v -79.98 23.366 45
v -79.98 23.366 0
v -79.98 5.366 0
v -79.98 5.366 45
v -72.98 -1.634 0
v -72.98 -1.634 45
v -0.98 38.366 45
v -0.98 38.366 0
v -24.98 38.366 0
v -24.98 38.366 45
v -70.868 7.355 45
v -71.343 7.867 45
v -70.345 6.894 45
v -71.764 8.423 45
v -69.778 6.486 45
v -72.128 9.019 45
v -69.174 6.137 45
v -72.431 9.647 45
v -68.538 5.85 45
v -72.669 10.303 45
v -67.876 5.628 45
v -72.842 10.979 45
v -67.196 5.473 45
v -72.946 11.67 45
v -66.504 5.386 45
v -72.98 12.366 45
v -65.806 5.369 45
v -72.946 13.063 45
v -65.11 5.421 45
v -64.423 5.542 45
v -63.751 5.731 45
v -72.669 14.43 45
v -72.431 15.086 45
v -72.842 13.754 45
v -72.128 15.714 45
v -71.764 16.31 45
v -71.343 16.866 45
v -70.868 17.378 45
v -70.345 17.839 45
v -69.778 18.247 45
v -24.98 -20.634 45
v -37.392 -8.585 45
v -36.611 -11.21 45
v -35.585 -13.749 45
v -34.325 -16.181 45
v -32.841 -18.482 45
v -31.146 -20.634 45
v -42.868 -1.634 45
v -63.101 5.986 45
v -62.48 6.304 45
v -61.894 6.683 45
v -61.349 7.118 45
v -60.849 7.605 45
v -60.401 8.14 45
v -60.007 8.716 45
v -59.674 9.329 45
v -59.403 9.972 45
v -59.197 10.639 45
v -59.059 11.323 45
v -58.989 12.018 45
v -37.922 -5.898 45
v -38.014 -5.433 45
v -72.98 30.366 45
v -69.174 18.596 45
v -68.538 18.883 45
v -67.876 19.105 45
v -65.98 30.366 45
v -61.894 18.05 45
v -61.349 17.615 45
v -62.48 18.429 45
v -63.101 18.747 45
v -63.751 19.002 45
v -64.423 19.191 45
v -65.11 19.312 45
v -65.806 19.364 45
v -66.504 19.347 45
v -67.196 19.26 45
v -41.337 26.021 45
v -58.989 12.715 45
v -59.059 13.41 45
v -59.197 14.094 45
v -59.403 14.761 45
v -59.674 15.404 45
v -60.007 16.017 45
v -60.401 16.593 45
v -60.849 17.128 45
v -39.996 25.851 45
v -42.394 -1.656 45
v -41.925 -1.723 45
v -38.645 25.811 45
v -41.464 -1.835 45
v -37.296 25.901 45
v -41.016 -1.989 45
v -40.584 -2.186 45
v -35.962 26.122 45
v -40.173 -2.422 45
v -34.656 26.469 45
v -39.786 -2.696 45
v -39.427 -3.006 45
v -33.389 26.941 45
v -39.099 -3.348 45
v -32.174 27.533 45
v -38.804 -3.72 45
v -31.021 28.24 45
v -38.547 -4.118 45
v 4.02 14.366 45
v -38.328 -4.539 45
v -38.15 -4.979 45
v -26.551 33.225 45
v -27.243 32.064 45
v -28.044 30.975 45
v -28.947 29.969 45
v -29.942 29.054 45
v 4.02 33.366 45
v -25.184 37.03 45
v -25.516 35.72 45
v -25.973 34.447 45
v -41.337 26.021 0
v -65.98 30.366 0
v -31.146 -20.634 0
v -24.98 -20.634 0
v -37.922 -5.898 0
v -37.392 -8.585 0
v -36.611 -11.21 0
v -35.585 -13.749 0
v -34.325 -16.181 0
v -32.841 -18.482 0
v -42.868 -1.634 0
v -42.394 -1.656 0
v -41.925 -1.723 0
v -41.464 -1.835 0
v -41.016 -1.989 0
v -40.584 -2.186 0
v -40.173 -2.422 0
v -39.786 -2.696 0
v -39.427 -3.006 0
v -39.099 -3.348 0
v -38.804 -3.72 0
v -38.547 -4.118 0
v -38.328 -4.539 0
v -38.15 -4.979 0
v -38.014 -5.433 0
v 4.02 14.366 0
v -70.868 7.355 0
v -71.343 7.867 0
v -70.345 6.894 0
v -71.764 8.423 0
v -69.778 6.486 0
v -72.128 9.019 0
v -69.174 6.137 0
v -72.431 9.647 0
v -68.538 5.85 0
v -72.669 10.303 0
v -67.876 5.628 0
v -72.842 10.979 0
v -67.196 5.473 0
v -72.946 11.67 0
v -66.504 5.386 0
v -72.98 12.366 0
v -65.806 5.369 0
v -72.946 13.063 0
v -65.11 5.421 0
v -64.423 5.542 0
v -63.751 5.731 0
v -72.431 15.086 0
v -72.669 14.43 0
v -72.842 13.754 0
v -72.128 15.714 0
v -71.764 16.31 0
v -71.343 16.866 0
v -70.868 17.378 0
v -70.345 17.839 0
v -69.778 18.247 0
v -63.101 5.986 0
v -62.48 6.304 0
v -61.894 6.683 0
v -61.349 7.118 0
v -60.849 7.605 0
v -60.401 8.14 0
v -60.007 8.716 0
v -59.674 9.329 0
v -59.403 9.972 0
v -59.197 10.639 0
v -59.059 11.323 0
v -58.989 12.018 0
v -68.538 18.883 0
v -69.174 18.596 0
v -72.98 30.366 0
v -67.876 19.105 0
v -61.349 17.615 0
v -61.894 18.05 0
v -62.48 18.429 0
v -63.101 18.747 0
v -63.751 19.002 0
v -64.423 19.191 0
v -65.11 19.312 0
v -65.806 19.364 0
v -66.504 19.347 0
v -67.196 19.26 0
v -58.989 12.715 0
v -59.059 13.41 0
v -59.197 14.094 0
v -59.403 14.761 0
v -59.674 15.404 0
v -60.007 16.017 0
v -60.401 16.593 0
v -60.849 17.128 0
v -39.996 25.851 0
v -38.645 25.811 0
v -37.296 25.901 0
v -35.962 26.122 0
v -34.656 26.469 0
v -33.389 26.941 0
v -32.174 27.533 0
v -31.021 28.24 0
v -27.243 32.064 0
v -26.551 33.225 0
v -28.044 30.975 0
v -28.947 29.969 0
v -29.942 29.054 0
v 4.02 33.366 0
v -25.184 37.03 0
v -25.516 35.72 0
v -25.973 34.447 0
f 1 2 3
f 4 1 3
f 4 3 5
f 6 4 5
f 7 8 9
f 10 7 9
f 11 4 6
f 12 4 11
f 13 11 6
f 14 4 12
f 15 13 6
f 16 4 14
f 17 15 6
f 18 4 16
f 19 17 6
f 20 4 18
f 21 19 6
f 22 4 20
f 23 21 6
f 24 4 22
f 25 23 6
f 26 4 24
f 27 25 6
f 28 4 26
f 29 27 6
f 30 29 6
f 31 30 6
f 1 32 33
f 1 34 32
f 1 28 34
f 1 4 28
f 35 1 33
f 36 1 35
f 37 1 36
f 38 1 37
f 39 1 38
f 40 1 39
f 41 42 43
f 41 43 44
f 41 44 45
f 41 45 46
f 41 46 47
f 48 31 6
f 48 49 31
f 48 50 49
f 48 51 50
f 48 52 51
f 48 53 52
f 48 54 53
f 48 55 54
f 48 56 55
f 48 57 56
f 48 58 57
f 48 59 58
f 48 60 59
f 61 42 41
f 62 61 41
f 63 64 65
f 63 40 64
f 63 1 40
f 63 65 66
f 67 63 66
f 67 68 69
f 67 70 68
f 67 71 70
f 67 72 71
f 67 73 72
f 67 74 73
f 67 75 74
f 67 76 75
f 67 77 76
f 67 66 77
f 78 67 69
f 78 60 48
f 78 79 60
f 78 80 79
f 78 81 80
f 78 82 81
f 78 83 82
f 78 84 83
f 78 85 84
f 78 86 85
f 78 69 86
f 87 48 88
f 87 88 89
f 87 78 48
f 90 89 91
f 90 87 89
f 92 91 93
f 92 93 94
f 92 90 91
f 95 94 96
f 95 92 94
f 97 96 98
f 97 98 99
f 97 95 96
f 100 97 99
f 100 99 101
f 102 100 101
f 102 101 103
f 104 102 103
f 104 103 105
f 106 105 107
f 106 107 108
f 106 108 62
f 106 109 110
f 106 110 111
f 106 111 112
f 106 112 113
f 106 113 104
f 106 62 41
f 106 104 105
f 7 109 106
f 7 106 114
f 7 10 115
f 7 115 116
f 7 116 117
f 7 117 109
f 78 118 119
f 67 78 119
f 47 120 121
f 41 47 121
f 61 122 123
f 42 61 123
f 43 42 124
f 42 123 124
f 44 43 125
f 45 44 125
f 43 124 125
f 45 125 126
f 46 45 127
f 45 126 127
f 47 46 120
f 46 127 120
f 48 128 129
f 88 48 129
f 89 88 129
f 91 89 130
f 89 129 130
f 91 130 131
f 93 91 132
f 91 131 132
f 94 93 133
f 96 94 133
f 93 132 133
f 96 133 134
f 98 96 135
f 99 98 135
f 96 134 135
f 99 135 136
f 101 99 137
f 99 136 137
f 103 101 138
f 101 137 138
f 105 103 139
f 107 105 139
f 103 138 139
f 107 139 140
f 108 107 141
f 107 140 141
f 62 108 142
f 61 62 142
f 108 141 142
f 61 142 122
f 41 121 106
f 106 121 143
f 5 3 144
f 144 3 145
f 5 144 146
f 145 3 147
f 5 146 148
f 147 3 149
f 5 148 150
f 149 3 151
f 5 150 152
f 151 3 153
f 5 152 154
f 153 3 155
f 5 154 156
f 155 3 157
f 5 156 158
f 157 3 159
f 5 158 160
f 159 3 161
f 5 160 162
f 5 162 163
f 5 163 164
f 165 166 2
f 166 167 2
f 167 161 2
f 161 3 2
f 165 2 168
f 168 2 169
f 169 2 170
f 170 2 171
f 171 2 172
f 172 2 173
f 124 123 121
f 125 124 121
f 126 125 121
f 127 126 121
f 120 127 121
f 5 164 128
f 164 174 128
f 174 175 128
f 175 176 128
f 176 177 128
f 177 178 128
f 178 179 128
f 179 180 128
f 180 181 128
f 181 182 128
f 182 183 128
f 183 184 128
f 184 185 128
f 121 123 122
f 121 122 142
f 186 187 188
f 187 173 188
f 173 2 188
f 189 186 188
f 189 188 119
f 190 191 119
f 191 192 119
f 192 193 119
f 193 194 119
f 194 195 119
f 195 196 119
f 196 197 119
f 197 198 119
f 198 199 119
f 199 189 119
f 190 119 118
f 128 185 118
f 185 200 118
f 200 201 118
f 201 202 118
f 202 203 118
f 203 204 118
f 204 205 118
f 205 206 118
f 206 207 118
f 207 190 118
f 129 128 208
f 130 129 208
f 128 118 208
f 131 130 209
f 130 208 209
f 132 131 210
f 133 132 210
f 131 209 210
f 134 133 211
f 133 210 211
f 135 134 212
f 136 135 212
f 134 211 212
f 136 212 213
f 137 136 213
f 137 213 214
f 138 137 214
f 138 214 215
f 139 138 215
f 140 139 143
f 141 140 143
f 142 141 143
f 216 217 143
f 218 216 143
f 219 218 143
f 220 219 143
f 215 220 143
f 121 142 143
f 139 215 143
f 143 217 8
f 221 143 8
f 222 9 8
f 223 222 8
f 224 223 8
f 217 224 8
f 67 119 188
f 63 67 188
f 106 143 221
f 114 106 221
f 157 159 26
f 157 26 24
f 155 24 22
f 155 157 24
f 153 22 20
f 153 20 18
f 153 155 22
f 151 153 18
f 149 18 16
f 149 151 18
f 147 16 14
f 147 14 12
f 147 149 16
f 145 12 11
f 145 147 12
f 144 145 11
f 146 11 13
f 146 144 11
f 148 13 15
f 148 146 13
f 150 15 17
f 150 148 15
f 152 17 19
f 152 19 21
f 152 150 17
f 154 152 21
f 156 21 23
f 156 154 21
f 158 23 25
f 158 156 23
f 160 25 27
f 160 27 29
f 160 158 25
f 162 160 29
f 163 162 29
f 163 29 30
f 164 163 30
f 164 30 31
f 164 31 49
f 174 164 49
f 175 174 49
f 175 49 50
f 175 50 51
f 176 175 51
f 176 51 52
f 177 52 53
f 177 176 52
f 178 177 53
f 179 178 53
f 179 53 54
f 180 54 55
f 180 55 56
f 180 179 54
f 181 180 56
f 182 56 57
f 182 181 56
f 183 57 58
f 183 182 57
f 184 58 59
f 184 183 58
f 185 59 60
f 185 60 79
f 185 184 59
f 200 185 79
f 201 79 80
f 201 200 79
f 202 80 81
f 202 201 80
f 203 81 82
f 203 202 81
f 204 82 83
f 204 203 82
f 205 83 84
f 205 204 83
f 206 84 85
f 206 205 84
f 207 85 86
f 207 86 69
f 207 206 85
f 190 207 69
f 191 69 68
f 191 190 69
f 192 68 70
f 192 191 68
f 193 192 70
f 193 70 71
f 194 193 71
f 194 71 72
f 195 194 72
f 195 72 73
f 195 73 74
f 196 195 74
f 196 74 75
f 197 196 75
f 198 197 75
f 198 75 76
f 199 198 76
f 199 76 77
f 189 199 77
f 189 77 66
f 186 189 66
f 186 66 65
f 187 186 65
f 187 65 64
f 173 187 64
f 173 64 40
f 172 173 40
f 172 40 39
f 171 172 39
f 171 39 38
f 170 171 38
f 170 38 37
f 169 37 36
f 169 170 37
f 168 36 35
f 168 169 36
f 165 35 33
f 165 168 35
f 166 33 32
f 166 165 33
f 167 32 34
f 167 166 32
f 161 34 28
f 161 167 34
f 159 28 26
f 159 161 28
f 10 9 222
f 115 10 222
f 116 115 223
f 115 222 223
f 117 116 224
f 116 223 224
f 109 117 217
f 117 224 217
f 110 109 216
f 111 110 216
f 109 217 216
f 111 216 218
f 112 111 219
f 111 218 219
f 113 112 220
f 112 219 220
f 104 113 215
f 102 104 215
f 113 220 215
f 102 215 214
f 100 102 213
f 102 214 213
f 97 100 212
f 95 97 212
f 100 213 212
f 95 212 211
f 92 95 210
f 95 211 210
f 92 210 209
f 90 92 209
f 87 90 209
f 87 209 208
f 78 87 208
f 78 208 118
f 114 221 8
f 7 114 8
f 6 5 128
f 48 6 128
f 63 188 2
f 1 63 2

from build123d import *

# Parameters (mm, degrees)
SKETCH1_R           = 7
BOSS_EXTRUDE1_DEPTH = 45


with BuildPart() as part:
    # Sketch1 → Boss-Extrude1 (new body)
    with BuildSketch(Plane.XY):
        with BuildLine():
            ThreePointArc((-42.867935385, -1.633500031), (-39.602699604, -2.846913799), (-37.922296644, -5.898205914))
            ThreePointArc((-37.922296644, -5.898205914), (-35.585466441, -13.749172092), (-31.146494244, -20.633500031))
            Line((-31.146494244, -20.633500031), (-24.980449087, -20.633500031))
            Line((-24.980449087, -20.633500031), (4.019550913, 14.366499969))
            Line((4.019550913, 14.366499969), (4.019550913, 33.366499969))
            Line((4.019550913, 33.366499969), (-0.980449087, 38.366499969))
            Line((-0.980449087, 38.366499969), (-24.980449087, 38.366499969))
            ThreePointArc((-24.980449087, 38.366499969), (-30.471993331, 28.634090038), (-41.337061073, 26.021205766))
            Line((-41.337061073, 26.021205766), (-65.980449087, 30.366499969))
            Line((-65.980449087, 30.366499969), (-72.980449087, 30.366499969))
            Line((-72.980449087, 30.366499969), (-79.980449087, 23.366499969))
            Line((-79.980449087, 23.366499969), (-79.980449087, 5.366499969))
            Line((-79.980449087, 5.366499969), (-72.980449087, -1.633500031))
            Line((-72.980449087, -1.633500031), (-42.867935385, -1.633500031))
        make_face()
        with Locations(Location((-65.980449087, 12.366499969, 0), (0, 0, 180))):
            Circle(SKETCH1_R, mode=Mode.SUBTRACT)
    extrude(amount=BOSS_EXTRUDE1_DEPTH)


solid = part.part
